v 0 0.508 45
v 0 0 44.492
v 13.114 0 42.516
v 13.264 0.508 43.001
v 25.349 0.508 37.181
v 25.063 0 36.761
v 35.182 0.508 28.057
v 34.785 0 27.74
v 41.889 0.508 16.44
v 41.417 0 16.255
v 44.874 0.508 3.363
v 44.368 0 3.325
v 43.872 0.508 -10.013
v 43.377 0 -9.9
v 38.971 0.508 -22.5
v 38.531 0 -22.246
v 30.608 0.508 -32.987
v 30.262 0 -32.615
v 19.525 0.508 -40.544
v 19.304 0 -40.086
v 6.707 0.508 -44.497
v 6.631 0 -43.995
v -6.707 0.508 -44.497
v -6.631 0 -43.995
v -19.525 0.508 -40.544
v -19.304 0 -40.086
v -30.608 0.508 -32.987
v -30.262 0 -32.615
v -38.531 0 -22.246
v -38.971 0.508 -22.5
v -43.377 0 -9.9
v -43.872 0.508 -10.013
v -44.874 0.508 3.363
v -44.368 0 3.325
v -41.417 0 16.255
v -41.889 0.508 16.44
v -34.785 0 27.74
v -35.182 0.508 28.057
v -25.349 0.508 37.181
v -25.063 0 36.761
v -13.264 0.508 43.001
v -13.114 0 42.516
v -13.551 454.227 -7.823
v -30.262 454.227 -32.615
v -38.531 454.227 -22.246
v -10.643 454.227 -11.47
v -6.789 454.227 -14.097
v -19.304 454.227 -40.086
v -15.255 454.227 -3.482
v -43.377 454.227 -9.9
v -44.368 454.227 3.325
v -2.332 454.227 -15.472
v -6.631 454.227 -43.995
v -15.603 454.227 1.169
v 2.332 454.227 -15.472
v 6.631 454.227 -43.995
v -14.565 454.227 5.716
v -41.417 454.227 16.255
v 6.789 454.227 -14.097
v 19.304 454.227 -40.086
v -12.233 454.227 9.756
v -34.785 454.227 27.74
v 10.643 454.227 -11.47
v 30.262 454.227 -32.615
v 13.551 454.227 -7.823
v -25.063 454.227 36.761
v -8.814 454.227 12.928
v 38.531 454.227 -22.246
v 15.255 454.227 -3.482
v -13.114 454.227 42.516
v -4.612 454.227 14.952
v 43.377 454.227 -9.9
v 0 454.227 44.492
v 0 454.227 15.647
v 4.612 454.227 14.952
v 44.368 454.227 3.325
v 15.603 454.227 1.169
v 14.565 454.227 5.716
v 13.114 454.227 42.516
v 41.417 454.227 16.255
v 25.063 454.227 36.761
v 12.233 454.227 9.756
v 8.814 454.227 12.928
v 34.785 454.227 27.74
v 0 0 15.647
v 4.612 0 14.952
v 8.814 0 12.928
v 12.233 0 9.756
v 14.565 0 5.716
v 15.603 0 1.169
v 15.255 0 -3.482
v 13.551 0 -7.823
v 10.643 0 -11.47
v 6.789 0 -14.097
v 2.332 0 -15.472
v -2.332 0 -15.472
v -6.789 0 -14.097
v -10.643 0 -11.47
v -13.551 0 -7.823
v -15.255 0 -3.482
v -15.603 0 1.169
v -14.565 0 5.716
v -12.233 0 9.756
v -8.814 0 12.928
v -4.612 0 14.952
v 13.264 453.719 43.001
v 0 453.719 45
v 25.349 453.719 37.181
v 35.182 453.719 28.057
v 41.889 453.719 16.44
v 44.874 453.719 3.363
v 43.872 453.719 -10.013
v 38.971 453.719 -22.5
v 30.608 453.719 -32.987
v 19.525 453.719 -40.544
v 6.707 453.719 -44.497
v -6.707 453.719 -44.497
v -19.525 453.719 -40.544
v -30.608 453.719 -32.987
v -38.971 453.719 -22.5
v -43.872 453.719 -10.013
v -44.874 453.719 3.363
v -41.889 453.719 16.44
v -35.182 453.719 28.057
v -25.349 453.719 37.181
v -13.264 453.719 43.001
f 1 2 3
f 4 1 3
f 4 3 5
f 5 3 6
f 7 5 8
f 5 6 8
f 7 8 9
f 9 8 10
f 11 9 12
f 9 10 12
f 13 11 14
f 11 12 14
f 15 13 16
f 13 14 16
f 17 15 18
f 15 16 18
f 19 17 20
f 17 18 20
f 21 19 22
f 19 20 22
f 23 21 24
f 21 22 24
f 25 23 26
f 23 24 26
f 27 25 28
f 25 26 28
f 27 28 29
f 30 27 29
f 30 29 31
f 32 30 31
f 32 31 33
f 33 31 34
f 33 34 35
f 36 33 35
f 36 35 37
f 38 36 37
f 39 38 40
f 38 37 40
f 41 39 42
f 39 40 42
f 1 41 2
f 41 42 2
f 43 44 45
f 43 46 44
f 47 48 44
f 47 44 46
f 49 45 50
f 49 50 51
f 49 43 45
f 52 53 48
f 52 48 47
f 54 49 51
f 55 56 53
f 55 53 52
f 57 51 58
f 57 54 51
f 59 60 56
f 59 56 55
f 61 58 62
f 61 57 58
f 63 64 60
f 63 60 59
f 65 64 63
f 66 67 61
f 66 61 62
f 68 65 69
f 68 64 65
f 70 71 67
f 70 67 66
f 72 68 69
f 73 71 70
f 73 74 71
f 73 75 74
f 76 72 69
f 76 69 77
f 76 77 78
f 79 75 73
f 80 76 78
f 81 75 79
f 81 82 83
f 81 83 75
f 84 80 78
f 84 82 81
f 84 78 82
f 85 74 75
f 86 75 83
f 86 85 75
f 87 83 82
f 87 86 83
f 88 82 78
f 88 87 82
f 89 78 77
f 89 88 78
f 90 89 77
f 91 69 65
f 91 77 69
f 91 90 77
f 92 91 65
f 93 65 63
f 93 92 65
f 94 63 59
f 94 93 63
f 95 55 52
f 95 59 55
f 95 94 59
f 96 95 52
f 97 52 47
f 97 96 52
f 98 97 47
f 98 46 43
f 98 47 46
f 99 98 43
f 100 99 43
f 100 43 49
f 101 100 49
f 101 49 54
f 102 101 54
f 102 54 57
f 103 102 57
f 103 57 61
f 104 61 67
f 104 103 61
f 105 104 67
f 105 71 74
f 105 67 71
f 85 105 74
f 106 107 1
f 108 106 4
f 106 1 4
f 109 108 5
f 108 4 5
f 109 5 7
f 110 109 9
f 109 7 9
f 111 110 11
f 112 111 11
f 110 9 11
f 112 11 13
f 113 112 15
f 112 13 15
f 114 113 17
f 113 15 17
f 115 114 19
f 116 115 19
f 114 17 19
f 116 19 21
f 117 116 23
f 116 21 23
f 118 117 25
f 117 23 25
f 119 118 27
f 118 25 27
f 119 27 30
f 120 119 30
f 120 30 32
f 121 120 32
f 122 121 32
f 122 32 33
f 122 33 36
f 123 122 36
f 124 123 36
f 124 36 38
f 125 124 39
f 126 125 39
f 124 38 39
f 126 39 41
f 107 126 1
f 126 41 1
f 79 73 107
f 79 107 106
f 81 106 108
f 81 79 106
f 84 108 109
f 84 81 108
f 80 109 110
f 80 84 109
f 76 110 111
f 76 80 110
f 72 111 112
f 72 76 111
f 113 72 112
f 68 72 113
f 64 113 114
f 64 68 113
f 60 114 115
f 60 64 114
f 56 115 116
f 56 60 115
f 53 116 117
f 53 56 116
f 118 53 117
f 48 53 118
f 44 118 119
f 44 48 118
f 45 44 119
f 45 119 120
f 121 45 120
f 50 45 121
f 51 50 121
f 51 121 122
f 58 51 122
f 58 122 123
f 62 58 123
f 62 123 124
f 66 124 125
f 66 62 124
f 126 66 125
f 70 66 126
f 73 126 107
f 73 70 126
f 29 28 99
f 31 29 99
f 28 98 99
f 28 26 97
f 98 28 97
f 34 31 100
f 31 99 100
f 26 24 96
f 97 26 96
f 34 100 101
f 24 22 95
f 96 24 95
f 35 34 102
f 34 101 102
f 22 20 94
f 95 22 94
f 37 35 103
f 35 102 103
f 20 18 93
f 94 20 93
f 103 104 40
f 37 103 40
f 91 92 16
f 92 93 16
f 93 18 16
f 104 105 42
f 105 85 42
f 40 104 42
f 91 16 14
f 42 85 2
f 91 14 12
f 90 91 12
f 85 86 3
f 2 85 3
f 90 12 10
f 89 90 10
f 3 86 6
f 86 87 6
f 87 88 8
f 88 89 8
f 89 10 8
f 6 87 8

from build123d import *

# Parameters (mm, degrees)
SKETCH1_R           = 45
BOSS_EXTRUDE1_DEPTH = 454.226625745
SKETCH2_R           = 15.646938019
CUT_EXTRUDE1_DEPTH  = 459.663087174
CHAMFER1_SIZE       = 0.507776997


with BuildPart() as part:
    # Sketch1 → Boss-Extrude1 (new body)
    with BuildSketch(Plane(origin=(0, 0, 0), x_dir=(1, 0, 0), z_dir=(0, 1, 0))):
        Circle(SKETCH1_R)
    extrude(amount=BOSS_EXTRUDE1_DEPTH)

    # Sketch2 → Cut-Extrude1 (cut, through all)
    with BuildSketch(Plane(origin=(0, 0, 0), x_dir=(1, 0, 0), z_dir=(0, 1, 0))):
        Circle(SKETCH2_R)
    extrude(amount=CUT_EXTRUDE1_DEPTH, mode=Mode.SUBTRACT)

    # Chamfer1
    chamfer1_edges = [part.edges().sort_by_distance(p)[0] for p in [
        (-45, 454.226625745, 0),
        (-45, 0, 0),
    ]]
    chamfer(chamfer1_edges, length=CHAMFER1_SIZE)


solid = part.part
